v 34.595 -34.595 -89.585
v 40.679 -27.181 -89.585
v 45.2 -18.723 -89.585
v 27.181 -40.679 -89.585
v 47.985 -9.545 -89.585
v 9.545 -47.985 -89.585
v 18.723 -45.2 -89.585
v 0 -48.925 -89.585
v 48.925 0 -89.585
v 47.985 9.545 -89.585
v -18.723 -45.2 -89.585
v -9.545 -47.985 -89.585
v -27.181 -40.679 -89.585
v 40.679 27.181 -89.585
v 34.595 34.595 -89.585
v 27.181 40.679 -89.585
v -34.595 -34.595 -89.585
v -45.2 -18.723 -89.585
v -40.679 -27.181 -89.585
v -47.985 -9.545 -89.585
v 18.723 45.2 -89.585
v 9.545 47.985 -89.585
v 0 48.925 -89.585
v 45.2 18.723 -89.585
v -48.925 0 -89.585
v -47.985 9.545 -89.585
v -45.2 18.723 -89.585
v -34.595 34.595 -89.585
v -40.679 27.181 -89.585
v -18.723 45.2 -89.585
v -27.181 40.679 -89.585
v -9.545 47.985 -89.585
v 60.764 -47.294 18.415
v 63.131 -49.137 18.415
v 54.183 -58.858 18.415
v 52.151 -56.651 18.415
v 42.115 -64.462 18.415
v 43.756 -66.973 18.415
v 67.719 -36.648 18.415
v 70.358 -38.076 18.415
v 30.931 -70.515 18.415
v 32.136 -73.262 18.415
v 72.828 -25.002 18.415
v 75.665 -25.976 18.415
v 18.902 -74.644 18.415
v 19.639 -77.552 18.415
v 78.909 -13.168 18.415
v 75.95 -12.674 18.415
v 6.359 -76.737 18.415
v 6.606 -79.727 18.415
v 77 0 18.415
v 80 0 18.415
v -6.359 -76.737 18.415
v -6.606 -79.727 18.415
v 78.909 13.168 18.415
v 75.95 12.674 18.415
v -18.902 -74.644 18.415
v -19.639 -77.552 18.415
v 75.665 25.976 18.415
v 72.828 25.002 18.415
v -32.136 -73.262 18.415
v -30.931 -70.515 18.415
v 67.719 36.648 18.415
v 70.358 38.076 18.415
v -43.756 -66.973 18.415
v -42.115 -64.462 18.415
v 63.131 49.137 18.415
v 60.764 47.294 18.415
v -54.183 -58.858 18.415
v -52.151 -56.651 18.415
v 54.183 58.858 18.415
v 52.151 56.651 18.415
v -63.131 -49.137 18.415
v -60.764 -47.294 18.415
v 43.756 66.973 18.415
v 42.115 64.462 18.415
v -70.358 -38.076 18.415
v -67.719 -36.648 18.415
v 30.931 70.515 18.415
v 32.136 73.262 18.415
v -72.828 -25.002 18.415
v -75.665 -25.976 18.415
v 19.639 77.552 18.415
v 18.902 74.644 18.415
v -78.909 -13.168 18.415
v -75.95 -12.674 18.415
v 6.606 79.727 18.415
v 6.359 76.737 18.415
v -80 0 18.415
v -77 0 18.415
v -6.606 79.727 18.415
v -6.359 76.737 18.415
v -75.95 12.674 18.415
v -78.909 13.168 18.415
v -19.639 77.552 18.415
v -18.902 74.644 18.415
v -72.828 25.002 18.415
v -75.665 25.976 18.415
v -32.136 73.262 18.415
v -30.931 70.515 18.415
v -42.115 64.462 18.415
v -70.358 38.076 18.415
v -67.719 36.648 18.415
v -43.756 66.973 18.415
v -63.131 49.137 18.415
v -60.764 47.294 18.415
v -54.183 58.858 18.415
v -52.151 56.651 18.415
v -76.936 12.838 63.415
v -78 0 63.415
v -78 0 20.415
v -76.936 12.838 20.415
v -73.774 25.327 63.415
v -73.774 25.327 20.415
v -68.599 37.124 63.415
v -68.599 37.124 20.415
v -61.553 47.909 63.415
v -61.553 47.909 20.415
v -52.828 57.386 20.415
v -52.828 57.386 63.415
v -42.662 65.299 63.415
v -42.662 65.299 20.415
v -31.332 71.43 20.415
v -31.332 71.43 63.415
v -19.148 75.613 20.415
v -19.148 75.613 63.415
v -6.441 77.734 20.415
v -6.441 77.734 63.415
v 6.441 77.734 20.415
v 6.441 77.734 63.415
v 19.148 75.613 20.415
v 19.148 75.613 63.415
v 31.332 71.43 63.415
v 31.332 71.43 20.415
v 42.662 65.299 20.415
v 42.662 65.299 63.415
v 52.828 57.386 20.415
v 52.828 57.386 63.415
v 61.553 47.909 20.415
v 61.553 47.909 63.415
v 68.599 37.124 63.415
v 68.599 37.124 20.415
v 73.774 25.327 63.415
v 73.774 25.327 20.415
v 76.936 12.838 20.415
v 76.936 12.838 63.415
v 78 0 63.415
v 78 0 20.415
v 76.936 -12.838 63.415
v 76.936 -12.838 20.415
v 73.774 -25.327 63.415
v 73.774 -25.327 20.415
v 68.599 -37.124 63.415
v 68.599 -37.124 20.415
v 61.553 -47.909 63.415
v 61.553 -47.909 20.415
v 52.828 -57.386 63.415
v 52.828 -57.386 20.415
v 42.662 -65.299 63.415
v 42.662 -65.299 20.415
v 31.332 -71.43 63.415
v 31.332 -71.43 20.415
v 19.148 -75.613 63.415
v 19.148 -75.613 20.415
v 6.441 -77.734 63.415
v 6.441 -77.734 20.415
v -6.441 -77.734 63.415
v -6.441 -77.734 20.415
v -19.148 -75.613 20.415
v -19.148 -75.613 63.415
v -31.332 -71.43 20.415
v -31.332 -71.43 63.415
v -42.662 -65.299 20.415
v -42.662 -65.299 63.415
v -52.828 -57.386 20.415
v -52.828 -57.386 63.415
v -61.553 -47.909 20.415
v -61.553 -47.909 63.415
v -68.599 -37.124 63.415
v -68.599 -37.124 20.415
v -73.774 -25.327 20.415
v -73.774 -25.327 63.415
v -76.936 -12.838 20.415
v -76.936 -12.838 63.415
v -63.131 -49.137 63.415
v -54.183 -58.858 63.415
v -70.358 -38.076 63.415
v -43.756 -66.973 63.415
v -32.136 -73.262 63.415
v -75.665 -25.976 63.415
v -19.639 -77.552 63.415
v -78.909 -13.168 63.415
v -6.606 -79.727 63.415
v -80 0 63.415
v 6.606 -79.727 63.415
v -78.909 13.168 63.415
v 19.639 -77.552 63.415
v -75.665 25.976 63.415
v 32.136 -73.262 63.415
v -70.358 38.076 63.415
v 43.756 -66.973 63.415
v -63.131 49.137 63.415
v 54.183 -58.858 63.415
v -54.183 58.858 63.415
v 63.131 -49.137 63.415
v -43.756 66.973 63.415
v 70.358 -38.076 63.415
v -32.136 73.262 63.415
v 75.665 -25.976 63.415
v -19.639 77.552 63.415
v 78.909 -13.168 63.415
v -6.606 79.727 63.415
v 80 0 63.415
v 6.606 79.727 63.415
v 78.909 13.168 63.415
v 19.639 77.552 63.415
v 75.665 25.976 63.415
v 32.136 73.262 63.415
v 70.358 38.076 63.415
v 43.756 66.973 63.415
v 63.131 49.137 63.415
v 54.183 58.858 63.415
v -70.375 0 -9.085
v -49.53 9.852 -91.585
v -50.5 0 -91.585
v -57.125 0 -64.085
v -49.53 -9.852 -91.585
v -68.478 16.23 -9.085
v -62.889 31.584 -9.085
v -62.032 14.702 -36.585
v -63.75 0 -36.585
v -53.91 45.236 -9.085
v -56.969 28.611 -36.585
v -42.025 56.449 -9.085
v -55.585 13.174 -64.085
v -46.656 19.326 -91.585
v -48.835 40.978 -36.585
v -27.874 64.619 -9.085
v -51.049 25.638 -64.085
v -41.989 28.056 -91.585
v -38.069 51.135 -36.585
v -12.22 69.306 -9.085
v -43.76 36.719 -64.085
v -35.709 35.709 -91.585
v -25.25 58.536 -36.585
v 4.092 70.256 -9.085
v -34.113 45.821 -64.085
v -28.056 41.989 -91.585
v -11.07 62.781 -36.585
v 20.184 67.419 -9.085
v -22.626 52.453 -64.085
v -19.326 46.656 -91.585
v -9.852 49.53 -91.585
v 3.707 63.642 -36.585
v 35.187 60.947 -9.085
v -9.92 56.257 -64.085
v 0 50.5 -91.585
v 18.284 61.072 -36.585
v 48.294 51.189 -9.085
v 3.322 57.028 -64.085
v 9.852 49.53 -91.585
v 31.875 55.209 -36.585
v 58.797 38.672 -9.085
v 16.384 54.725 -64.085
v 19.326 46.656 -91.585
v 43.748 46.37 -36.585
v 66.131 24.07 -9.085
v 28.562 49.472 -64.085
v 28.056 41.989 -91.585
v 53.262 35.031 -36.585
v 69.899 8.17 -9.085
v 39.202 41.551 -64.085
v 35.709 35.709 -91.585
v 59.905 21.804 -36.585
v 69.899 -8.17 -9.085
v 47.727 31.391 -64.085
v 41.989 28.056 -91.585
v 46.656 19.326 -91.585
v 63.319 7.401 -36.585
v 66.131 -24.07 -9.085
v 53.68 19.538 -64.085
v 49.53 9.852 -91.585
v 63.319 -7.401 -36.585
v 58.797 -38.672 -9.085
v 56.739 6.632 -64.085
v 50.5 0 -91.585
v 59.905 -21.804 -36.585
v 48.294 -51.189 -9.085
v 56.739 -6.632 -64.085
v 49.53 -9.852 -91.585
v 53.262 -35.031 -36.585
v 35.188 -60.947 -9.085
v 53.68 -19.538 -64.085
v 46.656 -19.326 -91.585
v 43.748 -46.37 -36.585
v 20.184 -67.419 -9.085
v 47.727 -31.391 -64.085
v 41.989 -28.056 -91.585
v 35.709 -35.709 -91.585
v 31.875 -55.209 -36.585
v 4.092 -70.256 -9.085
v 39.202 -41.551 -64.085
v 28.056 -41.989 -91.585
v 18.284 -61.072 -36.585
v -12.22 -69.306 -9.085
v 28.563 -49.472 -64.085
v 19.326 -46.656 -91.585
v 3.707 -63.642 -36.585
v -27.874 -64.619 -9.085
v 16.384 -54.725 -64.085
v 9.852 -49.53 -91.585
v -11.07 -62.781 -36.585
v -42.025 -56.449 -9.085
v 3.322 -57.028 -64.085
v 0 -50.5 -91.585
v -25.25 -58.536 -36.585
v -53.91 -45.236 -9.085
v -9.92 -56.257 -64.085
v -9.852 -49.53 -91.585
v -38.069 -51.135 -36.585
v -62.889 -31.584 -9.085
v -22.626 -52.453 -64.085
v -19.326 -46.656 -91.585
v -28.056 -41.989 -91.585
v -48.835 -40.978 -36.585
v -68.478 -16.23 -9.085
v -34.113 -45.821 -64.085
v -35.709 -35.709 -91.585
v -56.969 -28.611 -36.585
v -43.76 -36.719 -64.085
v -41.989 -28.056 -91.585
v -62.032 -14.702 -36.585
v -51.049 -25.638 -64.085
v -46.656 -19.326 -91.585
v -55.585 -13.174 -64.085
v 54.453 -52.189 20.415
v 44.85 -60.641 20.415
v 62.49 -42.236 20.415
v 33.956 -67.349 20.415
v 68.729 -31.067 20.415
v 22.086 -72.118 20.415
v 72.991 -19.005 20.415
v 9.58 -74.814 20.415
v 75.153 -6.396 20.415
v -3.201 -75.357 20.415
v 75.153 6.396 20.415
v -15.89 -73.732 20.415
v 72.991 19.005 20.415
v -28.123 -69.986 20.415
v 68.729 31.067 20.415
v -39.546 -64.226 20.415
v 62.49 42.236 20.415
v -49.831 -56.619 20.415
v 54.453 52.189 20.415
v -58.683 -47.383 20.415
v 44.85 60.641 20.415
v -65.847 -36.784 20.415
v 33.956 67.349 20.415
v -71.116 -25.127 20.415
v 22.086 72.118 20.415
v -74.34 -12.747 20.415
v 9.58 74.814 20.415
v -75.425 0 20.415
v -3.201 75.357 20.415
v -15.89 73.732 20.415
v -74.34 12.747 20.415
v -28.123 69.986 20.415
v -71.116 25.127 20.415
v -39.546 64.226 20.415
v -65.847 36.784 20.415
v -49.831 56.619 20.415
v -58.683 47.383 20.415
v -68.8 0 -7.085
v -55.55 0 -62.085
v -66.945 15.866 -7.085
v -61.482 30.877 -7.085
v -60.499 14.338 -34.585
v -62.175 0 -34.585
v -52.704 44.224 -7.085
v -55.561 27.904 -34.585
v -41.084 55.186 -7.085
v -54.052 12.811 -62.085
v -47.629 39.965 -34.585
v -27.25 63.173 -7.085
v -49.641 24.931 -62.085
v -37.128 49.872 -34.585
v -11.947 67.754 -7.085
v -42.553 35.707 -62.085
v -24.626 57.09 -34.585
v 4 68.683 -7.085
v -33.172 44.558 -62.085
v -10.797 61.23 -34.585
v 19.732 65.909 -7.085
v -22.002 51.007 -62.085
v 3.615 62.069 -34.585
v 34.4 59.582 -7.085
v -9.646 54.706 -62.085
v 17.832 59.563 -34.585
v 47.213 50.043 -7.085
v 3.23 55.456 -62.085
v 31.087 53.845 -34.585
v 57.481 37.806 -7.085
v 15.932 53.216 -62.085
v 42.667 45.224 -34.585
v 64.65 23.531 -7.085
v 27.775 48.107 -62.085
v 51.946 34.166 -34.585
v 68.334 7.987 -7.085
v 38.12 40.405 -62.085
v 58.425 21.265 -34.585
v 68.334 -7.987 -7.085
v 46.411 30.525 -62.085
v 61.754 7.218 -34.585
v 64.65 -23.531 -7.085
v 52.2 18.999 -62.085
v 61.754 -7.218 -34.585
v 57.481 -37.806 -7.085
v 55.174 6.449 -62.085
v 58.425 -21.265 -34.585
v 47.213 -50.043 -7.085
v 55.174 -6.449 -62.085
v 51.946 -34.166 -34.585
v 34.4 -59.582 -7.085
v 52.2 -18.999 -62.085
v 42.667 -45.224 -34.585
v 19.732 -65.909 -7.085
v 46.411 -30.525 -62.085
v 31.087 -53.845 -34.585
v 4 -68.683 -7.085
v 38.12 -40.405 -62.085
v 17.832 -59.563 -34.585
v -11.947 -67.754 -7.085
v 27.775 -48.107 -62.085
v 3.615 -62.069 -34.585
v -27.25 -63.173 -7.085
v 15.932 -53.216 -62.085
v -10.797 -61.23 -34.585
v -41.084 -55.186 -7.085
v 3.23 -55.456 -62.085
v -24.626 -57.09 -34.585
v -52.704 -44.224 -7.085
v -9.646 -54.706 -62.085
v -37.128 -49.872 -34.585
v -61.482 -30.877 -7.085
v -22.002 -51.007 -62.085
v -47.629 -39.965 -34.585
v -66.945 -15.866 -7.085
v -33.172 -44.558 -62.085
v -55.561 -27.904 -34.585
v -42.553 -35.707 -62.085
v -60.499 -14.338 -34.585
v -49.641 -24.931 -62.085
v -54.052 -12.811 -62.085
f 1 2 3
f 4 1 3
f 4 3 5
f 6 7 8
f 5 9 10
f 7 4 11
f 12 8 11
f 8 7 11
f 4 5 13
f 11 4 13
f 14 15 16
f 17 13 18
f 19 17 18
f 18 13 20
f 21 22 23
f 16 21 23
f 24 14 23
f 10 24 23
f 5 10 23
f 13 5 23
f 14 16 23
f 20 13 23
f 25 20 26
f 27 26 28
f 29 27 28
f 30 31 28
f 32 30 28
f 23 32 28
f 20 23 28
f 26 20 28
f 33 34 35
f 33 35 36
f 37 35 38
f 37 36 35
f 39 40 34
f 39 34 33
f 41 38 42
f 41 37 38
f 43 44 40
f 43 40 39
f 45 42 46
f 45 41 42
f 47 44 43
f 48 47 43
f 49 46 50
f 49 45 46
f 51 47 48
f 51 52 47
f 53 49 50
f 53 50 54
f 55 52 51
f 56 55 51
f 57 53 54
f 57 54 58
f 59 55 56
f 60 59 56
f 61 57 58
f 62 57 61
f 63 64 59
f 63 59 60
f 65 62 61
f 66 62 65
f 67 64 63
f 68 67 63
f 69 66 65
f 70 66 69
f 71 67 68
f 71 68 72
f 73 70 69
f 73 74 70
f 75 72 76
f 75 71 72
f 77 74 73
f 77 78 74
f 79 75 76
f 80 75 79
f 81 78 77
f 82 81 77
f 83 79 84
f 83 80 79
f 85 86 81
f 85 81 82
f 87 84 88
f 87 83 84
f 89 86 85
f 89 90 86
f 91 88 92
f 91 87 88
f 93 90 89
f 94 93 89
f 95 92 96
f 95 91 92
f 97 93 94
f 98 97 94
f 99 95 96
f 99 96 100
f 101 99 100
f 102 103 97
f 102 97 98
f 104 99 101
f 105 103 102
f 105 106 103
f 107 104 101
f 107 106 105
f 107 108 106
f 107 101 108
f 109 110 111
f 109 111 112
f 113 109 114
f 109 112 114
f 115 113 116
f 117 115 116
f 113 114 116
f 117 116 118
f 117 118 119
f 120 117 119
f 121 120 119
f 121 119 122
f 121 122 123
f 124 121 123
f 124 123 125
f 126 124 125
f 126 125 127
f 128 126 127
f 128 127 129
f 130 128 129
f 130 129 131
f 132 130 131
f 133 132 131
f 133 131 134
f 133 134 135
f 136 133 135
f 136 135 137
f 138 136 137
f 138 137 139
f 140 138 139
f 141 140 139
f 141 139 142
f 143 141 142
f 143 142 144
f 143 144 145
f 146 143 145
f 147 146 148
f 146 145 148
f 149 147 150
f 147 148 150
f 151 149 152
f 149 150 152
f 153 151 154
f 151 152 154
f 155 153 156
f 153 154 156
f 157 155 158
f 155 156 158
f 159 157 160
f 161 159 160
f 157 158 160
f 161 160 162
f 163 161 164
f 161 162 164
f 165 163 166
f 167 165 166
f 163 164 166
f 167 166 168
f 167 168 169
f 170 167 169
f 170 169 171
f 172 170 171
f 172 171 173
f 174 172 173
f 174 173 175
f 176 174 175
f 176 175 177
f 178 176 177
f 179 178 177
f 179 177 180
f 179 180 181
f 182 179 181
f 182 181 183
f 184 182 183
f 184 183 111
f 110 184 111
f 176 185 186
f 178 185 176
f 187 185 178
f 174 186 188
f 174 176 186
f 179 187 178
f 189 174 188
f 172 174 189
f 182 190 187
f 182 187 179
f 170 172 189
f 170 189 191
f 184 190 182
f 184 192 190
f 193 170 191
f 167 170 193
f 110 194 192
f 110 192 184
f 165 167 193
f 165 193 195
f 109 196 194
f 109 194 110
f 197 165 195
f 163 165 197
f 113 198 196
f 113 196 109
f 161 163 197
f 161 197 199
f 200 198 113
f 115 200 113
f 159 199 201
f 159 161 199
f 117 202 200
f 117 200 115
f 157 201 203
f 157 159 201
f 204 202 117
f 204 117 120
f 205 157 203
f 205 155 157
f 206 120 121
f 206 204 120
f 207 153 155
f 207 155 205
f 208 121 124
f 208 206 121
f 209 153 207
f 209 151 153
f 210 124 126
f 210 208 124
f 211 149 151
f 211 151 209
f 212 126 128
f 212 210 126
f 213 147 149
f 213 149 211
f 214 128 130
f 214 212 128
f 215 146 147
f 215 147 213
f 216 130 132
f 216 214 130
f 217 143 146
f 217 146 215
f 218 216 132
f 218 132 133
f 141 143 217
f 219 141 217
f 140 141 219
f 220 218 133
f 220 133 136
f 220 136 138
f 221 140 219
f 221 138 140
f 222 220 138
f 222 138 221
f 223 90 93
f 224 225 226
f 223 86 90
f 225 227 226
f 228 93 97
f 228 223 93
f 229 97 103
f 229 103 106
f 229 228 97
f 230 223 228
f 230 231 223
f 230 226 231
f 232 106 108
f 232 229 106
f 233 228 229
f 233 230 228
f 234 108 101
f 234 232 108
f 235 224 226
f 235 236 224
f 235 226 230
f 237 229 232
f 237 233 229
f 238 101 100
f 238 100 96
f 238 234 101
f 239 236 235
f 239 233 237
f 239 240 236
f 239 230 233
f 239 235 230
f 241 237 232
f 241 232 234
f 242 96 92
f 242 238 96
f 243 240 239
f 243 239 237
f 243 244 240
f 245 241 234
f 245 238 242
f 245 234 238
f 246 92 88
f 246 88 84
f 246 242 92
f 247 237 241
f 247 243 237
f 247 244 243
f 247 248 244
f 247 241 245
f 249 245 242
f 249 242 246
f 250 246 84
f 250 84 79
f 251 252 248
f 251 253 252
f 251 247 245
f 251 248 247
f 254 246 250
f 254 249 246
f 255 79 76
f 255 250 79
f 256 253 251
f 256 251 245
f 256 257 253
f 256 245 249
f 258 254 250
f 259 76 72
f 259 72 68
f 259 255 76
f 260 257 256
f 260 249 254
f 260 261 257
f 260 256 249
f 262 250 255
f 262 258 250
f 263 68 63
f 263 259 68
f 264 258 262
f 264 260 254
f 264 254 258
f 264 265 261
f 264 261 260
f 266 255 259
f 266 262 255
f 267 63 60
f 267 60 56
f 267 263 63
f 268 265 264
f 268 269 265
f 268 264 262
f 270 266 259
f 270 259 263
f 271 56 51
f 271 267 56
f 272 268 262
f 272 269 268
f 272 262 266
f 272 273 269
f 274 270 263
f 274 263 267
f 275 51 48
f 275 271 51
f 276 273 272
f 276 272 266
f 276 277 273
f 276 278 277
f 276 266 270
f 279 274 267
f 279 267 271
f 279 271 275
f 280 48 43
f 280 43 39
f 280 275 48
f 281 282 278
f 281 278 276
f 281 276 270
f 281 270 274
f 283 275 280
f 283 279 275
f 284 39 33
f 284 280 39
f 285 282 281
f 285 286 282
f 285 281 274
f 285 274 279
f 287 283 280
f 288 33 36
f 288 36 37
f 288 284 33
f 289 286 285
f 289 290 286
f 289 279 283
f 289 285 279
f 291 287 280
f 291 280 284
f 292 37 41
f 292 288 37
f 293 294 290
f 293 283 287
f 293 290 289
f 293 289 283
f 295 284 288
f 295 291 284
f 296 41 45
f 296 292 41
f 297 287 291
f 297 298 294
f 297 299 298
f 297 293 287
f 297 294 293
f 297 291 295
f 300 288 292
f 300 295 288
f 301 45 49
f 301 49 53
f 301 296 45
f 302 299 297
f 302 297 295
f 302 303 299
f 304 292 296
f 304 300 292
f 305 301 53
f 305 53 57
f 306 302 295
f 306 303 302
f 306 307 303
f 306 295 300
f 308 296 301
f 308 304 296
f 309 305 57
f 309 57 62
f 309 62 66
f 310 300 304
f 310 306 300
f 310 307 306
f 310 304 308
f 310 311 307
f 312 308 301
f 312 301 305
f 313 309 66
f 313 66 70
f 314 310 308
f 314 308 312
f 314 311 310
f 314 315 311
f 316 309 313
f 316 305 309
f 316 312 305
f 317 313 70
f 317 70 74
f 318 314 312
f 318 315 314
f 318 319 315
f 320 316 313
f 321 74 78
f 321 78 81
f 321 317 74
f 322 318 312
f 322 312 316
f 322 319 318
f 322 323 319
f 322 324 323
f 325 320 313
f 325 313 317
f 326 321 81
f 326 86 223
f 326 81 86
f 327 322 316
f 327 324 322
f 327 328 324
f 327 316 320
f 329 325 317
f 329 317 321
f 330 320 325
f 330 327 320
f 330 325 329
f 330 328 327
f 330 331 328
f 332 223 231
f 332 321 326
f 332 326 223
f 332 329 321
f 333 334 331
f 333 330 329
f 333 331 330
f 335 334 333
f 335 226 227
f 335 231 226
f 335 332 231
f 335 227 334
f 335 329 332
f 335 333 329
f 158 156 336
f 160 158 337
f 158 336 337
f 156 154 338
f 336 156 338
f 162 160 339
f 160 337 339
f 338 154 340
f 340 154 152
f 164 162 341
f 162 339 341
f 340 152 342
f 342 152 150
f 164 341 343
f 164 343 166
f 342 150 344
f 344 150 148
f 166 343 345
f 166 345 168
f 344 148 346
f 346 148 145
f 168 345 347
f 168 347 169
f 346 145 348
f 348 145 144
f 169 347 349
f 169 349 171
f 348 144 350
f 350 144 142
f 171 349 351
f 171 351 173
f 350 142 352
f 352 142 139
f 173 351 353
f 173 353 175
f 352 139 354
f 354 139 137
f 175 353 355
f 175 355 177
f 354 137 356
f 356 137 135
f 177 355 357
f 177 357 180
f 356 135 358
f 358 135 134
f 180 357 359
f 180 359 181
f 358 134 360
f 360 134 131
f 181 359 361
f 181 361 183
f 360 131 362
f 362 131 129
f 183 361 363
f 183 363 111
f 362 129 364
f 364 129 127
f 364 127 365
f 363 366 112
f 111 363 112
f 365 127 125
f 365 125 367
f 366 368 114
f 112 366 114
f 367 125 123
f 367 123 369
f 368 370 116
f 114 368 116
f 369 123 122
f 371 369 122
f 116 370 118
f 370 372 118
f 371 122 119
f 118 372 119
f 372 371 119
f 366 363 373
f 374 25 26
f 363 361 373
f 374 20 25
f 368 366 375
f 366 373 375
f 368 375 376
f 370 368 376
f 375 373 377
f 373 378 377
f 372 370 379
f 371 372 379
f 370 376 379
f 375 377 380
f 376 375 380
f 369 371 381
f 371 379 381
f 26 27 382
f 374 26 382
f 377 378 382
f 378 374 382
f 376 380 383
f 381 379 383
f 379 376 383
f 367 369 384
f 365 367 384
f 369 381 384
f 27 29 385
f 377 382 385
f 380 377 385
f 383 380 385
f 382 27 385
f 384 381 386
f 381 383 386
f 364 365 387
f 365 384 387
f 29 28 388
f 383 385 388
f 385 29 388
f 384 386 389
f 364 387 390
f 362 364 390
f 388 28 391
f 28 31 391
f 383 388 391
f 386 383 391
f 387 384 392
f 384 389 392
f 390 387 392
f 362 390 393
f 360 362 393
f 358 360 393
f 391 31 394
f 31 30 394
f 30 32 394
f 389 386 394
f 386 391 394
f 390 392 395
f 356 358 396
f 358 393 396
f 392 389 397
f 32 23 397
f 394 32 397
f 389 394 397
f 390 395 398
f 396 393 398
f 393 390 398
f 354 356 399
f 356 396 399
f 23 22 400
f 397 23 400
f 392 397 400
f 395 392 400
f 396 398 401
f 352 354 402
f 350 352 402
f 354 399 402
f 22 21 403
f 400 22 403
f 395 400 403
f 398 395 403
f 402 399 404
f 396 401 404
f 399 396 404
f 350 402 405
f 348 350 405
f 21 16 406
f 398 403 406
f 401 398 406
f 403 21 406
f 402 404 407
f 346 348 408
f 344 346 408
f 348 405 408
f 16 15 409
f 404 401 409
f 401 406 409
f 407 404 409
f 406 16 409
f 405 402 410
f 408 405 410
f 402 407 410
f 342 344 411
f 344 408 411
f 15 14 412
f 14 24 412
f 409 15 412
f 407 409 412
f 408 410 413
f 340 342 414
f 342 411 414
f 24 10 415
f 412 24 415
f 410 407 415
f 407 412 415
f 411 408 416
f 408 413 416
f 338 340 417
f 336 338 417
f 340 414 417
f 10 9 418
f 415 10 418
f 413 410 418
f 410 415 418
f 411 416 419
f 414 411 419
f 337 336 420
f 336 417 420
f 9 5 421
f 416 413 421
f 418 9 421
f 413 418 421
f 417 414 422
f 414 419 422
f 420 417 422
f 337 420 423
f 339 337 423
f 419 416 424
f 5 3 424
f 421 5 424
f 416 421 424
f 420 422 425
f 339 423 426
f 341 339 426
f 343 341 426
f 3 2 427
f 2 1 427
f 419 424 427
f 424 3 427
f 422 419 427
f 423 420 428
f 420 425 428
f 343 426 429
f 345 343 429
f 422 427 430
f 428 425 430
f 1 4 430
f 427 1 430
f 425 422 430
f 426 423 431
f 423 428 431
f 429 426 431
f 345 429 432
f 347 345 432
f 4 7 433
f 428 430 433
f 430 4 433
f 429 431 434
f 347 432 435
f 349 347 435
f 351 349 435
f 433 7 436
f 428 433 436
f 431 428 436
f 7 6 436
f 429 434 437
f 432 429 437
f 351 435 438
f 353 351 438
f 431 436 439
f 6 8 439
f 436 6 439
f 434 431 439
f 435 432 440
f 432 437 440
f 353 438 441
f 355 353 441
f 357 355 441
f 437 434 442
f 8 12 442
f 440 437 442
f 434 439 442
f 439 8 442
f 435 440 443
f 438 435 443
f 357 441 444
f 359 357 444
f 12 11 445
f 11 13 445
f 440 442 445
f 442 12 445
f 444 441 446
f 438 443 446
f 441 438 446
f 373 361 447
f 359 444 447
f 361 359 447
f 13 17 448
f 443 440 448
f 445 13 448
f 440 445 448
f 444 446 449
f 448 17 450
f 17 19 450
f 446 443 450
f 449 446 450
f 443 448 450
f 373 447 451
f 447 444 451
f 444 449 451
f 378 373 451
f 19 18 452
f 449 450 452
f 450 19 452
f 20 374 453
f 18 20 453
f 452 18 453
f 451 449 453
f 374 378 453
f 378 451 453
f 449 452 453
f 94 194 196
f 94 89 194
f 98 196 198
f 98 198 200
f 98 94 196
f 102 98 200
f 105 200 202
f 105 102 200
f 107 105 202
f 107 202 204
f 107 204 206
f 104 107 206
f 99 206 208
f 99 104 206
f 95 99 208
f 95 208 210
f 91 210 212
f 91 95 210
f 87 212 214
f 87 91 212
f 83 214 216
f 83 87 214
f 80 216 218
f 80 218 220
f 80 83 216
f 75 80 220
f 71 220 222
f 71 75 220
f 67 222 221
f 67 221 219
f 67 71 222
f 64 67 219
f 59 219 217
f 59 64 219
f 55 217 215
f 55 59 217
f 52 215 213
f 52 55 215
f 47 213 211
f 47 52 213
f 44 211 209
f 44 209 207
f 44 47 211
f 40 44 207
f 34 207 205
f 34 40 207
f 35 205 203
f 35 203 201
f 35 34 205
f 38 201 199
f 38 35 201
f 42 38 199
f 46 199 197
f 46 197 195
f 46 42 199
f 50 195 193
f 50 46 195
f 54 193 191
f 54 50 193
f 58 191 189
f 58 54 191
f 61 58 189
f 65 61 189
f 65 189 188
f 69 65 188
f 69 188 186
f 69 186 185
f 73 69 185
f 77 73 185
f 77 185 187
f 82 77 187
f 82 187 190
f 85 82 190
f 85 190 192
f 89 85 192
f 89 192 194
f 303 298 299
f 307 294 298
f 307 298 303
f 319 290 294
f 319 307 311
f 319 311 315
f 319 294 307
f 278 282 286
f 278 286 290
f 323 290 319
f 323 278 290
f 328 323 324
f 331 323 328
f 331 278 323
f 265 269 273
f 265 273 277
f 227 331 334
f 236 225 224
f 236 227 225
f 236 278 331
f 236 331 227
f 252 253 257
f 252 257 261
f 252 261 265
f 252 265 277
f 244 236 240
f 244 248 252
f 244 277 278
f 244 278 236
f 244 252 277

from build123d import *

# Parameters (mm, degrees)
F2_T = -2


# Not quite as in the source:
# - a feature names something its author has since deleted; it is built from what else it names


with BuildPart() as f1:
    # F0 (on Front) → F1 (revolve)
    with BuildSketch(Plane.XZ):
        Polygon((0, -91.5846474071), (0, 63.4153525929), (-80, 63.4153525929), (-80, 18.4153525929), (-77, 18.4153525929), (-50.5, -91.5846474071), align=None)
    revolve(axis=Axis((0, 0, -14.0846474071), (0, 0, -1)))

    # F2
    f2_openings = [f1.faces().sort_by_distance(p)[0] for p in [
        (0, 0, 63.415353),
    ]]
    offset(amount=F2_T, openings=f2_openings, kind=Kind.INTERSECTION)


solid = f1.part
